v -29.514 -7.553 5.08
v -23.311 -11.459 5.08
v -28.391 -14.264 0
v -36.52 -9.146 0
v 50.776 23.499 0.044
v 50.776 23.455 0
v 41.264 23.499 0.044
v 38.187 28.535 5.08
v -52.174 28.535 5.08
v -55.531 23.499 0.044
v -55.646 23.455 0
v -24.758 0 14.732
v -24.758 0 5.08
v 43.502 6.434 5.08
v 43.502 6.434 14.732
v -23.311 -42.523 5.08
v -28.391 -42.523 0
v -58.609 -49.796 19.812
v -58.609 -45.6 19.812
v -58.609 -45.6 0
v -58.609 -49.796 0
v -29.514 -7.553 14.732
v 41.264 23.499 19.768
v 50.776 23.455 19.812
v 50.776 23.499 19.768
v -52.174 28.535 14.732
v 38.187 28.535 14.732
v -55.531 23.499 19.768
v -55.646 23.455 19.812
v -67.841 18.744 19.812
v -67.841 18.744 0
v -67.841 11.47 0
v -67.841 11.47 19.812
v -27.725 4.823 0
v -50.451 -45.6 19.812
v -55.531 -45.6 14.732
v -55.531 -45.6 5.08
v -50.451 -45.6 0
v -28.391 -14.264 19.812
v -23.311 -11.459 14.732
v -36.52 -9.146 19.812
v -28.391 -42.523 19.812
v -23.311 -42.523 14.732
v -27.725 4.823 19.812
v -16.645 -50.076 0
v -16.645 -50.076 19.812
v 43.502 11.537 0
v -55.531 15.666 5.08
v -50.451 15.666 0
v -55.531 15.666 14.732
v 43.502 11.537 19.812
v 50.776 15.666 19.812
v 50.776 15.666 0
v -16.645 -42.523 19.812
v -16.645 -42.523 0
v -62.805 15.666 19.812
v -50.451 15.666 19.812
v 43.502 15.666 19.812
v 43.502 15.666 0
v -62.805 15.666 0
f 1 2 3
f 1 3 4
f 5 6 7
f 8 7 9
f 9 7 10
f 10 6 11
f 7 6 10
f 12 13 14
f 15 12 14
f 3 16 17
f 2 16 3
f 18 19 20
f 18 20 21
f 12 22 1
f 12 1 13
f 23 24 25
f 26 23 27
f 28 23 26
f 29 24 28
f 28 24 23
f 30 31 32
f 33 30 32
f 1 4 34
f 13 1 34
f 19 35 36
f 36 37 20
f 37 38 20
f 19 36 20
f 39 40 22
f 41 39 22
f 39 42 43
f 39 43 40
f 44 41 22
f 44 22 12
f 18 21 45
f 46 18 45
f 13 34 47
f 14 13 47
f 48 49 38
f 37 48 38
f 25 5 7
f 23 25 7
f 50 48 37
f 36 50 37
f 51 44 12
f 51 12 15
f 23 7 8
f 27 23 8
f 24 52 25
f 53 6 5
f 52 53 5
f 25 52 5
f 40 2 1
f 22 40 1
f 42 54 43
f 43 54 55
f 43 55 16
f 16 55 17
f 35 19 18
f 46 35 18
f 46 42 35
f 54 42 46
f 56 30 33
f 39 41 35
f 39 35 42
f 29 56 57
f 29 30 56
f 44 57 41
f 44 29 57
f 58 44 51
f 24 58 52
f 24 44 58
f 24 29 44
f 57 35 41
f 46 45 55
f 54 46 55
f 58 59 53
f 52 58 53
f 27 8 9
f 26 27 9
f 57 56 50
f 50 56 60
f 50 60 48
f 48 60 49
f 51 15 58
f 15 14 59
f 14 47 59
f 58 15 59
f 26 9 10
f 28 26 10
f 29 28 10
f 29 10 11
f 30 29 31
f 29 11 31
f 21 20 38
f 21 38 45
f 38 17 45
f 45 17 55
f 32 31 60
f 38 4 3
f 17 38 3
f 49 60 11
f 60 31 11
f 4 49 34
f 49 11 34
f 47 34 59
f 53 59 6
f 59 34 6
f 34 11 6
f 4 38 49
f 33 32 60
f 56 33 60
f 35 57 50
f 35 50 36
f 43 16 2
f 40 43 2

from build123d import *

# Parameters (mm, degrees)
F1_DEPTH = 19.812
F2_SIZE  = 5.08
F3_SIZE  = 5.08


with BuildPart() as f1:
    # F0 (on Top) → F1 (new body)
    with BuildSketch(Plane.XY):
        Polygon((-58.608726, -45.600105), (-58.608726, -49.796436), (-16.645437, -50.076187), (-16.645437, -42.522795), (-23.311197, -42.522795), (-23.311197, -25.737481), (-23.311197, -11.458973), (-29.514179, -7.553392), (-24.758339, 0), (43.50194, 6.43437), (43.50194, 15.666293), (50.775576, 15.666293), (50.775576, 23.49944), (41.263901, 23.49944), (38.186591, 28.535035), (-52.174356, 28.535035), (-55.531416, 23.49944), (-67.840651, 18.743601), (-67.840651, 11.469965), (-62.805057, 15.666293), (-55.531416, 15.666293), (-55.531416, -45.600105), align=None)
    extrude(amount=F1_DEPTH)

    # F2
    f2_edges = [f1.edges().sort_by_distance(p)[0] for p in [
        (-6.993882, 28.535035, 19.812),
        (9.3718, 3.217185, 19.812),
        (-55.531416, -14.966906, 19.812),
        (-23.311197, -26.990884, 19.812),
        (-26.412688, -9.506182, 19.812),
        (-27.136259, -3.776696, 19.812),
    ]]
    chamfer(f2_edges, length=F2_SIZE)

    # F3
    f3_edges = [f1.edges().sort_by_distance(p)[0] for p in [
        (-55.531416, -14.966906, 0),
        (-6.993882, 28.535035, 0),
        (9.3718, 3.217185, 0),
        (-23.311197, -26.990884, 0),
        (-26.412688, -9.506182, 0),
        (-27.136259, -3.776696, 0),
    ]]
    chamfer(f3_edges, length=F3_SIZE)


solid = f1.part
